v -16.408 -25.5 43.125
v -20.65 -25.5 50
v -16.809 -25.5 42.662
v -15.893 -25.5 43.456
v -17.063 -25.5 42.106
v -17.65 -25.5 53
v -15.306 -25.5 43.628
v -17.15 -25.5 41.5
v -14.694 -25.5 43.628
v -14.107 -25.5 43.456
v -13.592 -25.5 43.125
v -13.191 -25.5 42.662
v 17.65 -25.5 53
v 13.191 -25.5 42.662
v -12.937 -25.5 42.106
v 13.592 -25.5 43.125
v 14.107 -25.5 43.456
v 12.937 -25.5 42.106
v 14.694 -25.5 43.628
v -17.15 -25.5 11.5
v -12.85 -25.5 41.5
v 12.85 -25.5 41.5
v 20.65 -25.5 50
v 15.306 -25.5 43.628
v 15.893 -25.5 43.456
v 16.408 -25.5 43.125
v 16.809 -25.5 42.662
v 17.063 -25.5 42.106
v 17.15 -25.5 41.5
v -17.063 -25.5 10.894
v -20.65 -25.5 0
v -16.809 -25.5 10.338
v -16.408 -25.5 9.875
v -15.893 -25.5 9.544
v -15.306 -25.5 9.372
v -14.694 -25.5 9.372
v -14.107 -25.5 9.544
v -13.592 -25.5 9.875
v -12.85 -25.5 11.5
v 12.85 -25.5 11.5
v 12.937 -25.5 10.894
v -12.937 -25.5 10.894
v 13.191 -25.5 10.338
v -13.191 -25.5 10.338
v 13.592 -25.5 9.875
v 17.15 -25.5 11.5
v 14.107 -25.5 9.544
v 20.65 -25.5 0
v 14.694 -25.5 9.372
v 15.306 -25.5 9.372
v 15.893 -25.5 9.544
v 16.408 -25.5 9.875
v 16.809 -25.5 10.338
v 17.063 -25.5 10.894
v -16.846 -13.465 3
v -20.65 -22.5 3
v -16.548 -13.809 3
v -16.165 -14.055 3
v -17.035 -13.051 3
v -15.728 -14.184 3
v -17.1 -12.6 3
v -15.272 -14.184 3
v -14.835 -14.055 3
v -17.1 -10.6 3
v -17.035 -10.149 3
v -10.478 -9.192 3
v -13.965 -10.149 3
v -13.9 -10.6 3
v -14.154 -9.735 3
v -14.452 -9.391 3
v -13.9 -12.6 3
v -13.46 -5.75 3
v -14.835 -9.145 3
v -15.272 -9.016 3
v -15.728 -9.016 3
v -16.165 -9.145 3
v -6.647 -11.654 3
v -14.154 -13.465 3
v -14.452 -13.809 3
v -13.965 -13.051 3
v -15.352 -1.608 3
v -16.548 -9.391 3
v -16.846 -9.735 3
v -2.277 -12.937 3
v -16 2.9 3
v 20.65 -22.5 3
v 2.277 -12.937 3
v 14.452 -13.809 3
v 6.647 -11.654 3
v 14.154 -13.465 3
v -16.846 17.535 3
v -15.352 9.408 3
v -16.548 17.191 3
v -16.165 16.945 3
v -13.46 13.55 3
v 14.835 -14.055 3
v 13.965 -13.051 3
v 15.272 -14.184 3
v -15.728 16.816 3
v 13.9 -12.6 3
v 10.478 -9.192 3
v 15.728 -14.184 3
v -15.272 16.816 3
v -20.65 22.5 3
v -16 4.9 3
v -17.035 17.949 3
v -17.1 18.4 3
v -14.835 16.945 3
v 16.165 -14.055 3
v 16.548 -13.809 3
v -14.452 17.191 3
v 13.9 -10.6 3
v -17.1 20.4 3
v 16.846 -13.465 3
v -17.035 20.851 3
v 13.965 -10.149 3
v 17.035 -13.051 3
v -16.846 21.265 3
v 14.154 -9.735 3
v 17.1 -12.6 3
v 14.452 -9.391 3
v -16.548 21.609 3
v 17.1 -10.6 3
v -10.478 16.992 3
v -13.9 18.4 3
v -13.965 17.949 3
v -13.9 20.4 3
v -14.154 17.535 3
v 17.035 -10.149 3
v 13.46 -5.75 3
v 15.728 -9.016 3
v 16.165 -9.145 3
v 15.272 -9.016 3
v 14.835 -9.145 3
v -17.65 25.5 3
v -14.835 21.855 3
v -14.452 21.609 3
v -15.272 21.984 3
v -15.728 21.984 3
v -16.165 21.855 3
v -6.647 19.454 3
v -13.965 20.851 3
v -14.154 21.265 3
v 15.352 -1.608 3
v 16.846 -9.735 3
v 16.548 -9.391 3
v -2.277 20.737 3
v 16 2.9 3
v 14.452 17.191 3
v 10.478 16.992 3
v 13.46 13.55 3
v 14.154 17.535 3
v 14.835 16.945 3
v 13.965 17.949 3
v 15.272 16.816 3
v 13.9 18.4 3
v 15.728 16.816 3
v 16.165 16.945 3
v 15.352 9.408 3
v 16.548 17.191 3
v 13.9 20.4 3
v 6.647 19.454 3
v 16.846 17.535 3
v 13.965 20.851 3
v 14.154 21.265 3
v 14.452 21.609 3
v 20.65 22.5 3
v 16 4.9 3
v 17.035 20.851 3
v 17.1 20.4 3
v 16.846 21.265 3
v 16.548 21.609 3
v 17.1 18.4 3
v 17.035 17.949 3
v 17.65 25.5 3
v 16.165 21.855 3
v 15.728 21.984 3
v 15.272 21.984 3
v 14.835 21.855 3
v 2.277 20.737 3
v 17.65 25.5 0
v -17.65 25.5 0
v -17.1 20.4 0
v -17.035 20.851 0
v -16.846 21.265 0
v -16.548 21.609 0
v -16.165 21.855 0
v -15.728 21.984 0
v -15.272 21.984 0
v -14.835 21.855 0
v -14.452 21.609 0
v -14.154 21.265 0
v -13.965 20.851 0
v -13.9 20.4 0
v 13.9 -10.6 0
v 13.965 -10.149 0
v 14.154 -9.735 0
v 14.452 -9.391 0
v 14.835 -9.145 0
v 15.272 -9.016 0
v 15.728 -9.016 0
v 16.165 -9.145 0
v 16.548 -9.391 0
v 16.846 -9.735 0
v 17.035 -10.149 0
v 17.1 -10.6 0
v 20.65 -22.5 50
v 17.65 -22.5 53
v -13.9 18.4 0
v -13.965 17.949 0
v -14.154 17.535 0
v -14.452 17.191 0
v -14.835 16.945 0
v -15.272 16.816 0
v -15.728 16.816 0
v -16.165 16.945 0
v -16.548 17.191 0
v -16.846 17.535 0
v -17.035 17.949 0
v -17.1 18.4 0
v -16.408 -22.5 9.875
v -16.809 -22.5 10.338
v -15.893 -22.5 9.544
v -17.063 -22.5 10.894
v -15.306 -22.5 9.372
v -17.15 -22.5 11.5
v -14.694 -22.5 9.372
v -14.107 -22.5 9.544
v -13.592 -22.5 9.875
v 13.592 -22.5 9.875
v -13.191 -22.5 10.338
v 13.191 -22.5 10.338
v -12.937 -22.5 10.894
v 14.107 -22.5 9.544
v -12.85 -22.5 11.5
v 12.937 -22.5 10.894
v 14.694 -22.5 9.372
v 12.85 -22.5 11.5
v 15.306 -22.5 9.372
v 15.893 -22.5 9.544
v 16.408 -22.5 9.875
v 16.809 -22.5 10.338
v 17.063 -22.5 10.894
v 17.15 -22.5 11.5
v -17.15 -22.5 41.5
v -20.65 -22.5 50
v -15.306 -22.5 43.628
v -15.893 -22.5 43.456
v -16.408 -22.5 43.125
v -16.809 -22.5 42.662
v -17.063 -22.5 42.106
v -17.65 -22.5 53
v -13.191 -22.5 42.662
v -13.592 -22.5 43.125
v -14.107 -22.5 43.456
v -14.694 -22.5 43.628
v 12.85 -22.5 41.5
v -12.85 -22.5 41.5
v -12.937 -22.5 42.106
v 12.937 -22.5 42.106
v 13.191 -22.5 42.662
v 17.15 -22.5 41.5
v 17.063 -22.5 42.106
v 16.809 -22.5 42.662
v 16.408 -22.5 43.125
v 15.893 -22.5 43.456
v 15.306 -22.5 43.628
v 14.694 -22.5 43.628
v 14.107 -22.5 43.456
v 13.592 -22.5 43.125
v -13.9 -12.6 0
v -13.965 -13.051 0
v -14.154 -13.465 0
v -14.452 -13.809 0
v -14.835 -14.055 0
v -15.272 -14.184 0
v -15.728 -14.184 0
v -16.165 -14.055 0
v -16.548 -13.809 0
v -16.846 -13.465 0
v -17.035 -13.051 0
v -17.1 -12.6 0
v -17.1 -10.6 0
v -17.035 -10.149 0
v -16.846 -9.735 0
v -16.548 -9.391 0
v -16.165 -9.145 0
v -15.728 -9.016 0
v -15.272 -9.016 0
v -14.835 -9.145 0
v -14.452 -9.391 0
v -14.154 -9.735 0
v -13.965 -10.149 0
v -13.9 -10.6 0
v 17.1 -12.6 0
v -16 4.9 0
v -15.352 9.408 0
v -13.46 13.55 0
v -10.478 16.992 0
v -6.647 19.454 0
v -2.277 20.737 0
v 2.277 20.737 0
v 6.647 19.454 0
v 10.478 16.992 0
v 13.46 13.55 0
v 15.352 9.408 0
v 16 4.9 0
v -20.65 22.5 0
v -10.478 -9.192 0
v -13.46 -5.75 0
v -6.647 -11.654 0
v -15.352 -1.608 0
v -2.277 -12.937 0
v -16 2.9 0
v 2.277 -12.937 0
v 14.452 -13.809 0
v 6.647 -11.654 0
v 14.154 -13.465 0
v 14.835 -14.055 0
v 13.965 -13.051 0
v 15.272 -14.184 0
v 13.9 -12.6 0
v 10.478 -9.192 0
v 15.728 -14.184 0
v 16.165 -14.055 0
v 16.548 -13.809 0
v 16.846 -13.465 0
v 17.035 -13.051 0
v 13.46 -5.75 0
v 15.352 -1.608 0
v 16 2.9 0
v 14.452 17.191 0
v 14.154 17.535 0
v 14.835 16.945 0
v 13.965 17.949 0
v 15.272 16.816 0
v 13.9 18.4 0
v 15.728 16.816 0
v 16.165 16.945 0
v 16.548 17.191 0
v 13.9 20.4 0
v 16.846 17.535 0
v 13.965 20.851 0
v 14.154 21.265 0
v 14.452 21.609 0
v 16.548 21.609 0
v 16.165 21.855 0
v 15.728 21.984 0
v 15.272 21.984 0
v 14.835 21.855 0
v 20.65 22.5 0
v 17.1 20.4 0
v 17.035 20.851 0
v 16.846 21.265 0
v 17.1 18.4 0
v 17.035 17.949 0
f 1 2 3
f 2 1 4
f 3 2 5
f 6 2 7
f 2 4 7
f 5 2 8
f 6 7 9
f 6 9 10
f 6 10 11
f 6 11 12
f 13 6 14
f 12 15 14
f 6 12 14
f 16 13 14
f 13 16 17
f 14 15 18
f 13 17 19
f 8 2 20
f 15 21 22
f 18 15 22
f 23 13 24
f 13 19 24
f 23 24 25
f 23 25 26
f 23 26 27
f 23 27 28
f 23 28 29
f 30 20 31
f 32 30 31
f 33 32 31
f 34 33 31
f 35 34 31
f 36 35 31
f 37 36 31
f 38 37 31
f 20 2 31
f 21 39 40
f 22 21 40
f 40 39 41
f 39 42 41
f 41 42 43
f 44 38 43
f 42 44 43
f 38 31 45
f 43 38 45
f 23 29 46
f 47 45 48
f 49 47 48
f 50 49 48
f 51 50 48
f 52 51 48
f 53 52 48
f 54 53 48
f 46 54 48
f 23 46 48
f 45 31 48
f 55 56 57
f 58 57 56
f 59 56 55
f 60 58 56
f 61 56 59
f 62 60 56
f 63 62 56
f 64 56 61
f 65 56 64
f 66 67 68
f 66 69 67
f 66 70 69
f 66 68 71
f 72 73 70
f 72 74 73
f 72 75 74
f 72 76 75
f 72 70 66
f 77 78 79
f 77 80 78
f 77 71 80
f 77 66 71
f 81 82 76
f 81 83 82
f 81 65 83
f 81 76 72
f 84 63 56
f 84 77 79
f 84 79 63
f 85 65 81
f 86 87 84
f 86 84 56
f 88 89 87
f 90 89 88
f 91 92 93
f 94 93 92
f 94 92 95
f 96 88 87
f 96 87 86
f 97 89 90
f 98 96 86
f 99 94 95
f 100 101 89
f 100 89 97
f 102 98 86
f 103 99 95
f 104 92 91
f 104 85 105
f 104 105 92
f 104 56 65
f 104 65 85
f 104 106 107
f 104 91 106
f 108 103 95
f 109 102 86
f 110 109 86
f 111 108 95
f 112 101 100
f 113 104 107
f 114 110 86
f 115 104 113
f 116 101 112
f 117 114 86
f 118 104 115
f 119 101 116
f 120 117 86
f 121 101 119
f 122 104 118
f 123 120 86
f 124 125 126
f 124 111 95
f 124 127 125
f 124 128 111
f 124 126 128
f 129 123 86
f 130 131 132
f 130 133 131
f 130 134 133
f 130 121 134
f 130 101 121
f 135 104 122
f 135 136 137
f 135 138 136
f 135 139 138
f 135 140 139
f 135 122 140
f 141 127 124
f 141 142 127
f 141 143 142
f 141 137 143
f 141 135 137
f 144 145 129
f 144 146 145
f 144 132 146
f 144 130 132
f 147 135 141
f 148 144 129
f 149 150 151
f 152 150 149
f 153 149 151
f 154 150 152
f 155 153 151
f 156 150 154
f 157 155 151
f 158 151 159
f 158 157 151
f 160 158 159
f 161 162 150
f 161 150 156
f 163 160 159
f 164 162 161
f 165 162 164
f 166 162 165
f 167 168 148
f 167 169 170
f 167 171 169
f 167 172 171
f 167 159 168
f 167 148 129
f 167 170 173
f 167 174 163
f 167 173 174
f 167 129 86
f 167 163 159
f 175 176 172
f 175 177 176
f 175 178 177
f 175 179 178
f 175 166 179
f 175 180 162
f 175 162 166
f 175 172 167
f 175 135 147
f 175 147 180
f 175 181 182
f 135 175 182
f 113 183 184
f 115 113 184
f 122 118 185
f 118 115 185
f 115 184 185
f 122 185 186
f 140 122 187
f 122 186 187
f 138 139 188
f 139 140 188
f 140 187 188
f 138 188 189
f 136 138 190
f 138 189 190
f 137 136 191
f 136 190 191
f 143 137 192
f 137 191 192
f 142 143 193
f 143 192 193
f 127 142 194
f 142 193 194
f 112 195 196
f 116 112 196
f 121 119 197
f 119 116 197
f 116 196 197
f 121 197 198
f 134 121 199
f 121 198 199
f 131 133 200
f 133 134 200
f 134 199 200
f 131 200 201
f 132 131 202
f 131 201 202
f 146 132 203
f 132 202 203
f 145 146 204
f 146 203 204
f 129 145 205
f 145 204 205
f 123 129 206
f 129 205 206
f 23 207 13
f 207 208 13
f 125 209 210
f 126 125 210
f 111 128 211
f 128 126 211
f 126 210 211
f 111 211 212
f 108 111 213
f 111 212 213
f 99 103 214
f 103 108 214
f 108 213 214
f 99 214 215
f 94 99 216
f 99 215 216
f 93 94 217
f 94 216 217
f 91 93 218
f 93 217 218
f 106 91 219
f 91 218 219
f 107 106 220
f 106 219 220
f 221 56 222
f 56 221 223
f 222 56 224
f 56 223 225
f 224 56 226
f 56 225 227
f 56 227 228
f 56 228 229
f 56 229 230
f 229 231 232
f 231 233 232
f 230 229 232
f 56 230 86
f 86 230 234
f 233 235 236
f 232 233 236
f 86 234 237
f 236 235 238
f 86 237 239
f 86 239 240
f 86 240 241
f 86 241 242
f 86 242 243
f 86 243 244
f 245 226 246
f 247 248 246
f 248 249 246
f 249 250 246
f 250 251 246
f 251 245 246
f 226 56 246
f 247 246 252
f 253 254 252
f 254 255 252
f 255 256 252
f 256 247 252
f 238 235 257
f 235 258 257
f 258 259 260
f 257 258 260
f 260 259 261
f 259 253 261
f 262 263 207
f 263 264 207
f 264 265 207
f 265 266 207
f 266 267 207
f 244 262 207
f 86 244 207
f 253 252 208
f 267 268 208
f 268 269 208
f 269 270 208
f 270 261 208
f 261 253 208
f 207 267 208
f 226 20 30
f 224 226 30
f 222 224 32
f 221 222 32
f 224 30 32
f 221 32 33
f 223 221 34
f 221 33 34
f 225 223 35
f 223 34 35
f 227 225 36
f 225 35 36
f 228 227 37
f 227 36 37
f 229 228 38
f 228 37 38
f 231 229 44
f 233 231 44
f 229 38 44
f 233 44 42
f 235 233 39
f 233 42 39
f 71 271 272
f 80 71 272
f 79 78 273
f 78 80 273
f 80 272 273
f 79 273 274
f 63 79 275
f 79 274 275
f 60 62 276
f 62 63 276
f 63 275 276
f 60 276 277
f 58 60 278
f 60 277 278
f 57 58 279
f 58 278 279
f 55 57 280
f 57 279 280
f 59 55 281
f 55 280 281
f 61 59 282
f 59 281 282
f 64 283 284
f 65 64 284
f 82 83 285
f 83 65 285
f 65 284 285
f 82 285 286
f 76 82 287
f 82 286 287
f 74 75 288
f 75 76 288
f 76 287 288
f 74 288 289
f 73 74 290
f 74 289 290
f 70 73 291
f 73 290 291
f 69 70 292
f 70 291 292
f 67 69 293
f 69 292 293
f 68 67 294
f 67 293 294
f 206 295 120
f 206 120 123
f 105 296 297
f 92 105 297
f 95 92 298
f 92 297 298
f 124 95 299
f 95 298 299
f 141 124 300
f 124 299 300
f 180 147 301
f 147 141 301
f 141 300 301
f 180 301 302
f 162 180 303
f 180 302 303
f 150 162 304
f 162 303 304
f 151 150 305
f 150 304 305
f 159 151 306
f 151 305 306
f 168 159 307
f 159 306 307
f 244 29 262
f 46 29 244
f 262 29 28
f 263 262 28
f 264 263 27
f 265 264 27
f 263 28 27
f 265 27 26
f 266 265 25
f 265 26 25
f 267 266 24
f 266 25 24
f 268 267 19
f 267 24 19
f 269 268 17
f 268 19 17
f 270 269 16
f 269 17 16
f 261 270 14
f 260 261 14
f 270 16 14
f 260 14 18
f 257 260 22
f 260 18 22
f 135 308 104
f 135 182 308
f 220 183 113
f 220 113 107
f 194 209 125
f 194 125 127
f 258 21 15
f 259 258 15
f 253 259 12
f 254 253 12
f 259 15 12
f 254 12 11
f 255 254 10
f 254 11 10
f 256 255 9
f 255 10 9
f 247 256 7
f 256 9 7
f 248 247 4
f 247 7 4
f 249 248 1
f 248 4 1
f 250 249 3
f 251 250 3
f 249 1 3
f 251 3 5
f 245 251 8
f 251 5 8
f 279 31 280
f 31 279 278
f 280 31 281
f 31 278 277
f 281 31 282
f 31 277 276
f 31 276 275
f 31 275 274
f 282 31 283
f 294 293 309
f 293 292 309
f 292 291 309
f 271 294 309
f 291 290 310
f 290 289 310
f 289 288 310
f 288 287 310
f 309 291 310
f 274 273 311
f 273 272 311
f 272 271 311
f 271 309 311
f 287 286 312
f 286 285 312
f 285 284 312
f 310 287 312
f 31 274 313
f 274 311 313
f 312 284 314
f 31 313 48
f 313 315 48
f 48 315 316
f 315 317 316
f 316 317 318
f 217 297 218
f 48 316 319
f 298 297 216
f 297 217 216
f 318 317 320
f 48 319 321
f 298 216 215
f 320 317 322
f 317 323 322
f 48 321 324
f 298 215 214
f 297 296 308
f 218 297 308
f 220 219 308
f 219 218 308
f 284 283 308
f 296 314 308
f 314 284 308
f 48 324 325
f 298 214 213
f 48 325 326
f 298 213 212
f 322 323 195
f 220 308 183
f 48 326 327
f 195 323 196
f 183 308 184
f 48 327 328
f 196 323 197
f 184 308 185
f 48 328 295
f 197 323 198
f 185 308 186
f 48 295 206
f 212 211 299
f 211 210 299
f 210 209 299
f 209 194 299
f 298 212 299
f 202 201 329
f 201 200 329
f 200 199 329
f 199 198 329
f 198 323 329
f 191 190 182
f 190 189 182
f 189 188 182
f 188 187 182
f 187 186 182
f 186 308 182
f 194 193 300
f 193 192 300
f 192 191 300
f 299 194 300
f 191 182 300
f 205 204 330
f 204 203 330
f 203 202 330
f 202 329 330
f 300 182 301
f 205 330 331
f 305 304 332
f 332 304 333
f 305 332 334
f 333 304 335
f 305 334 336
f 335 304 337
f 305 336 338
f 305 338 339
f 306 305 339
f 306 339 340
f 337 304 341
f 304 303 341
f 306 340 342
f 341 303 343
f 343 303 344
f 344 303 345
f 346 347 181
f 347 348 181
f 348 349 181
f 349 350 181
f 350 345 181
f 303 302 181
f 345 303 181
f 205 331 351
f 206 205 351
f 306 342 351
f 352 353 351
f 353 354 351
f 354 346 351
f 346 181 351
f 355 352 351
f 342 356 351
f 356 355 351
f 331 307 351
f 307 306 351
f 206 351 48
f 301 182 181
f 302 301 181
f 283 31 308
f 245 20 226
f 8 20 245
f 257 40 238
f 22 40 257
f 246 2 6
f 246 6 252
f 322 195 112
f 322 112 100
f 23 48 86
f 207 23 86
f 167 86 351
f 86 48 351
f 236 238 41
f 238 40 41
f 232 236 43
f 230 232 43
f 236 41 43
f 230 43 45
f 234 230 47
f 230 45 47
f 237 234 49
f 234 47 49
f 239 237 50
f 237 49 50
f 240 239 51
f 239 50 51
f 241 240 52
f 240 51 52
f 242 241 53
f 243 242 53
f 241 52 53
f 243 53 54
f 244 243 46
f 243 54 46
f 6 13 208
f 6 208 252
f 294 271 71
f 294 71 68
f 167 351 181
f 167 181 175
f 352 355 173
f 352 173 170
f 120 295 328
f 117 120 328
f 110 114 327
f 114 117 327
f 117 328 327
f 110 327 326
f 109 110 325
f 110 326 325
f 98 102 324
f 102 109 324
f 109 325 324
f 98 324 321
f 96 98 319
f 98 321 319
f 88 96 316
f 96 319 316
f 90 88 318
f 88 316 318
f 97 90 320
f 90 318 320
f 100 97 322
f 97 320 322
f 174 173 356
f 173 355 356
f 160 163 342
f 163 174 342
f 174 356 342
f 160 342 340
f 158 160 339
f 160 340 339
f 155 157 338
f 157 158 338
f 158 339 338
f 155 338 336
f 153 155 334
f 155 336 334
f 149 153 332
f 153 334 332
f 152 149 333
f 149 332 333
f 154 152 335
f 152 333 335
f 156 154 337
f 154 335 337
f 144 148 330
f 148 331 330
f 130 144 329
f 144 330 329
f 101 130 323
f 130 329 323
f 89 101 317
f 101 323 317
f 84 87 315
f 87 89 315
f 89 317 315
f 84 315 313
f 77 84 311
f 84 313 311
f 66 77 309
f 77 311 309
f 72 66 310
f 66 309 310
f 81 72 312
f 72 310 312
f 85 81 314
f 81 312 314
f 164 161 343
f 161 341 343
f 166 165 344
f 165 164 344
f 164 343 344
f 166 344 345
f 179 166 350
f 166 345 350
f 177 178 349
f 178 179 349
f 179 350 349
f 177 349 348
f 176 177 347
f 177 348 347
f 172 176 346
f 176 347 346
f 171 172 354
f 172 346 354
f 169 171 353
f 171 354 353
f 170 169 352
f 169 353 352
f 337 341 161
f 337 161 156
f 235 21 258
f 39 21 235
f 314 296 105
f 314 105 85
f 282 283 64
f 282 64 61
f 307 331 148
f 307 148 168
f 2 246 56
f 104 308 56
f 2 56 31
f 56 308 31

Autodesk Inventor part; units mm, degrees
ref_plane "YZ Plane" through (0, 0, 0) normal (1, 0, 0) x (0, 1, 0)
ref_plane "XZ Plane" through (0, 0, 0) normal (0, 1, 0) x (-1, 0, 0)
ref_plane "XY Plane" through (0, 0, 0) normal (0, 0, 1) x (1, 0, 0)
sketch "Sketch1" plane through (0, 0, 0) normal (0, 0, 1) x (1, 0, 0)
  line L0 (-20.65, -25.5) -> (20.65, -25.5)
  line L1 (20.65, -25.5) -> (20.65, 25.5)
  line L2 (20.65, 25.5) -> (-20.65, 25.5)
  line L3 (-20.65, 25.5) -> (-20.65, -25.5)
  line L4 (-20.65, -25.5) -> (20.65, 25.5) construction
  line L5 (20.65, -25.5) -> (-20.65, 25.5) construction
  line L6 (0, 2.9) -> (0, 4.9) construction
  line L7 (16, 2.9) -> (16, 4.9)
  line L8 (-16, 4.9) -> (-16, 2.9)
  arc A0 (-16, 2.9) -> (16, 2.9) centre (0, 2.9) ccw
  arc A1 (16, 4.9) -> (-16, 4.9) centre (0, 4.9) ccw
  line L9 (-15.5, 20.4) -> (-15.5, 18.4) construction
  line L10 (-17.1, 20.4) -> (-17.1, 18.4)
  line L11 (-13.9, 18.4) -> (-13.9, 20.4)
  arc A2 (-13.9, 20.4) -> (-17.1, 20.4) centre (-15.5, 20.4) ccw
  arc A3 (-17.1, 18.4) -> (-13.9, 18.4) centre (-15.5, 18.4) ccw
  line L12 (15.5, 20.4) -> (15.5, 18.4) construction
  line L13 (13.9, 20.4) -> (13.9, 18.4)
  line L14 (17.1, 18.4) -> (17.1, 20.4)
  arc A4 (17.1, 20.4) -> (13.9, 20.4) centre (15.5, 20.4) ccw
  arc A5 (13.9, 18.4) -> (17.1, 18.4) centre (15.5, 18.4) ccw
  line L15 (15.5, -10.6) -> (15.5, -12.6) construction
  line L16 (13.9, -10.6) -> (13.9, -12.6)
  line L17 (17.1, -12.6) -> (17.1, -10.6)
  arc A6 (17.1, -10.6) -> (13.9, -10.6) centre (15.5, -10.6) ccw
  arc A7 (13.9, -12.6) -> (17.1, -12.6) centre (15.5, -12.6) ccw
  line L18 (-15.5, -10.6) -> (-15.5, -12.6) construction
  line L19 (-17.1, -10.6) -> (-17.1, -12.6)
  line L20 (-13.9, -12.6) -> (-13.9, -10.6)
  arc A8 (-13.9, -10.6) -> (-17.1, -10.6) centre (-15.5, -10.6) ccw
  arc A9 (-17.1, -12.6) -> (-13.9, -12.6) centre (-15.5, -12.6) ccw
  point P0 (0, 0)
  point P1 (0, 3.9)
  point P2 (-15.5, 19.4)
  point P3 (15.5, 19.4)
  point P4 (15.5, -11.6)
  point P5 (-15.5, -11.6)
  dimension "d0" = 51
  dimension "d1" = 41.3
  dimension "d2" = 28.4
  dimension "d3" = 2
  dimension "d4" = 16
  dimension "d5" = 2
  dimension "d6" = 31
  dimension "d7" = 31
  dimension "d8" = 1.6
  dimension "d10" = 15.5
  dimension "d11" = 15.5
  dimension "d22" = 51
extrude "Extrusion1" add sketch "Sketch1" along normal blind 3
sketch "Sketch2" plane through (-20.65, -25.5, 0) normal (0, -1, 0) x (1, 0, 0)
  line L0 (41.3, 0) -> (41.3, 3) projected
  line L1 (0, 0) -> (41.3, 0)
  line L2 (41.3, 0) -> (41.3, 53)
  line L3 (41.3, 53) -> (0, 53)
  line L4 (0, 53) -> (0, 0)
  line L5 (5.65, 11.5) -> (5.65, 41.5) construction
  line L6 (3.5, 11.5) -> (3.5, 41.5)
  line L7 (7.8, 41.5) -> (7.8, 11.5)
  arc A0 (3.5, 11.5) -> (7.8, 11.5) centre (5.65, 11.5) ccw
  arc A1 (7.8, 41.5) -> (3.5, 41.5) centre (5.65, 41.5) ccw
  line L8 (35.65, 11.5) -> (35.65, 41.5) construction
  line L9 (33.5, 11.5) -> (33.5, 41.5)
  line L10 (37.8, 41.5) -> (37.8, 11.5)
  arc A2 (33.5, 11.5) -> (37.8, 11.5) centre (35.65, 11.5) ccw
  arc A3 (37.8, 41.5) -> (33.5, 41.5) centre (35.65, 41.5) ccw
  line L11 (0, 26.5) -> (5.65, 26.5) construction
  line L12 (5.65, 26.5) -> (35.65, 26.5) construction
  line L13 (20.65, 26.5) -> (20.65, 53) construction
  point P0 (20.65, 0)
  dimension "d14" = 53
  dimension "d23" = 4.3
  dimension "d24" = 30
  dimension "d25" = 30
extrude "Extrusion3" add sketch "Sketch2" against normal blind 3
chamfer "Chamfer1" distance 3 angle 45 4 edges at (20.65, 25.5, 1.5) (-20.65, 25.5, 1.5) (-20.65, -24, 53) (20.65, -24, 53)
equation "\"d10\" = 0.5 * d7"
equation "\"d11\" = 0.5 * d6"
properties part number "StepperMount"
